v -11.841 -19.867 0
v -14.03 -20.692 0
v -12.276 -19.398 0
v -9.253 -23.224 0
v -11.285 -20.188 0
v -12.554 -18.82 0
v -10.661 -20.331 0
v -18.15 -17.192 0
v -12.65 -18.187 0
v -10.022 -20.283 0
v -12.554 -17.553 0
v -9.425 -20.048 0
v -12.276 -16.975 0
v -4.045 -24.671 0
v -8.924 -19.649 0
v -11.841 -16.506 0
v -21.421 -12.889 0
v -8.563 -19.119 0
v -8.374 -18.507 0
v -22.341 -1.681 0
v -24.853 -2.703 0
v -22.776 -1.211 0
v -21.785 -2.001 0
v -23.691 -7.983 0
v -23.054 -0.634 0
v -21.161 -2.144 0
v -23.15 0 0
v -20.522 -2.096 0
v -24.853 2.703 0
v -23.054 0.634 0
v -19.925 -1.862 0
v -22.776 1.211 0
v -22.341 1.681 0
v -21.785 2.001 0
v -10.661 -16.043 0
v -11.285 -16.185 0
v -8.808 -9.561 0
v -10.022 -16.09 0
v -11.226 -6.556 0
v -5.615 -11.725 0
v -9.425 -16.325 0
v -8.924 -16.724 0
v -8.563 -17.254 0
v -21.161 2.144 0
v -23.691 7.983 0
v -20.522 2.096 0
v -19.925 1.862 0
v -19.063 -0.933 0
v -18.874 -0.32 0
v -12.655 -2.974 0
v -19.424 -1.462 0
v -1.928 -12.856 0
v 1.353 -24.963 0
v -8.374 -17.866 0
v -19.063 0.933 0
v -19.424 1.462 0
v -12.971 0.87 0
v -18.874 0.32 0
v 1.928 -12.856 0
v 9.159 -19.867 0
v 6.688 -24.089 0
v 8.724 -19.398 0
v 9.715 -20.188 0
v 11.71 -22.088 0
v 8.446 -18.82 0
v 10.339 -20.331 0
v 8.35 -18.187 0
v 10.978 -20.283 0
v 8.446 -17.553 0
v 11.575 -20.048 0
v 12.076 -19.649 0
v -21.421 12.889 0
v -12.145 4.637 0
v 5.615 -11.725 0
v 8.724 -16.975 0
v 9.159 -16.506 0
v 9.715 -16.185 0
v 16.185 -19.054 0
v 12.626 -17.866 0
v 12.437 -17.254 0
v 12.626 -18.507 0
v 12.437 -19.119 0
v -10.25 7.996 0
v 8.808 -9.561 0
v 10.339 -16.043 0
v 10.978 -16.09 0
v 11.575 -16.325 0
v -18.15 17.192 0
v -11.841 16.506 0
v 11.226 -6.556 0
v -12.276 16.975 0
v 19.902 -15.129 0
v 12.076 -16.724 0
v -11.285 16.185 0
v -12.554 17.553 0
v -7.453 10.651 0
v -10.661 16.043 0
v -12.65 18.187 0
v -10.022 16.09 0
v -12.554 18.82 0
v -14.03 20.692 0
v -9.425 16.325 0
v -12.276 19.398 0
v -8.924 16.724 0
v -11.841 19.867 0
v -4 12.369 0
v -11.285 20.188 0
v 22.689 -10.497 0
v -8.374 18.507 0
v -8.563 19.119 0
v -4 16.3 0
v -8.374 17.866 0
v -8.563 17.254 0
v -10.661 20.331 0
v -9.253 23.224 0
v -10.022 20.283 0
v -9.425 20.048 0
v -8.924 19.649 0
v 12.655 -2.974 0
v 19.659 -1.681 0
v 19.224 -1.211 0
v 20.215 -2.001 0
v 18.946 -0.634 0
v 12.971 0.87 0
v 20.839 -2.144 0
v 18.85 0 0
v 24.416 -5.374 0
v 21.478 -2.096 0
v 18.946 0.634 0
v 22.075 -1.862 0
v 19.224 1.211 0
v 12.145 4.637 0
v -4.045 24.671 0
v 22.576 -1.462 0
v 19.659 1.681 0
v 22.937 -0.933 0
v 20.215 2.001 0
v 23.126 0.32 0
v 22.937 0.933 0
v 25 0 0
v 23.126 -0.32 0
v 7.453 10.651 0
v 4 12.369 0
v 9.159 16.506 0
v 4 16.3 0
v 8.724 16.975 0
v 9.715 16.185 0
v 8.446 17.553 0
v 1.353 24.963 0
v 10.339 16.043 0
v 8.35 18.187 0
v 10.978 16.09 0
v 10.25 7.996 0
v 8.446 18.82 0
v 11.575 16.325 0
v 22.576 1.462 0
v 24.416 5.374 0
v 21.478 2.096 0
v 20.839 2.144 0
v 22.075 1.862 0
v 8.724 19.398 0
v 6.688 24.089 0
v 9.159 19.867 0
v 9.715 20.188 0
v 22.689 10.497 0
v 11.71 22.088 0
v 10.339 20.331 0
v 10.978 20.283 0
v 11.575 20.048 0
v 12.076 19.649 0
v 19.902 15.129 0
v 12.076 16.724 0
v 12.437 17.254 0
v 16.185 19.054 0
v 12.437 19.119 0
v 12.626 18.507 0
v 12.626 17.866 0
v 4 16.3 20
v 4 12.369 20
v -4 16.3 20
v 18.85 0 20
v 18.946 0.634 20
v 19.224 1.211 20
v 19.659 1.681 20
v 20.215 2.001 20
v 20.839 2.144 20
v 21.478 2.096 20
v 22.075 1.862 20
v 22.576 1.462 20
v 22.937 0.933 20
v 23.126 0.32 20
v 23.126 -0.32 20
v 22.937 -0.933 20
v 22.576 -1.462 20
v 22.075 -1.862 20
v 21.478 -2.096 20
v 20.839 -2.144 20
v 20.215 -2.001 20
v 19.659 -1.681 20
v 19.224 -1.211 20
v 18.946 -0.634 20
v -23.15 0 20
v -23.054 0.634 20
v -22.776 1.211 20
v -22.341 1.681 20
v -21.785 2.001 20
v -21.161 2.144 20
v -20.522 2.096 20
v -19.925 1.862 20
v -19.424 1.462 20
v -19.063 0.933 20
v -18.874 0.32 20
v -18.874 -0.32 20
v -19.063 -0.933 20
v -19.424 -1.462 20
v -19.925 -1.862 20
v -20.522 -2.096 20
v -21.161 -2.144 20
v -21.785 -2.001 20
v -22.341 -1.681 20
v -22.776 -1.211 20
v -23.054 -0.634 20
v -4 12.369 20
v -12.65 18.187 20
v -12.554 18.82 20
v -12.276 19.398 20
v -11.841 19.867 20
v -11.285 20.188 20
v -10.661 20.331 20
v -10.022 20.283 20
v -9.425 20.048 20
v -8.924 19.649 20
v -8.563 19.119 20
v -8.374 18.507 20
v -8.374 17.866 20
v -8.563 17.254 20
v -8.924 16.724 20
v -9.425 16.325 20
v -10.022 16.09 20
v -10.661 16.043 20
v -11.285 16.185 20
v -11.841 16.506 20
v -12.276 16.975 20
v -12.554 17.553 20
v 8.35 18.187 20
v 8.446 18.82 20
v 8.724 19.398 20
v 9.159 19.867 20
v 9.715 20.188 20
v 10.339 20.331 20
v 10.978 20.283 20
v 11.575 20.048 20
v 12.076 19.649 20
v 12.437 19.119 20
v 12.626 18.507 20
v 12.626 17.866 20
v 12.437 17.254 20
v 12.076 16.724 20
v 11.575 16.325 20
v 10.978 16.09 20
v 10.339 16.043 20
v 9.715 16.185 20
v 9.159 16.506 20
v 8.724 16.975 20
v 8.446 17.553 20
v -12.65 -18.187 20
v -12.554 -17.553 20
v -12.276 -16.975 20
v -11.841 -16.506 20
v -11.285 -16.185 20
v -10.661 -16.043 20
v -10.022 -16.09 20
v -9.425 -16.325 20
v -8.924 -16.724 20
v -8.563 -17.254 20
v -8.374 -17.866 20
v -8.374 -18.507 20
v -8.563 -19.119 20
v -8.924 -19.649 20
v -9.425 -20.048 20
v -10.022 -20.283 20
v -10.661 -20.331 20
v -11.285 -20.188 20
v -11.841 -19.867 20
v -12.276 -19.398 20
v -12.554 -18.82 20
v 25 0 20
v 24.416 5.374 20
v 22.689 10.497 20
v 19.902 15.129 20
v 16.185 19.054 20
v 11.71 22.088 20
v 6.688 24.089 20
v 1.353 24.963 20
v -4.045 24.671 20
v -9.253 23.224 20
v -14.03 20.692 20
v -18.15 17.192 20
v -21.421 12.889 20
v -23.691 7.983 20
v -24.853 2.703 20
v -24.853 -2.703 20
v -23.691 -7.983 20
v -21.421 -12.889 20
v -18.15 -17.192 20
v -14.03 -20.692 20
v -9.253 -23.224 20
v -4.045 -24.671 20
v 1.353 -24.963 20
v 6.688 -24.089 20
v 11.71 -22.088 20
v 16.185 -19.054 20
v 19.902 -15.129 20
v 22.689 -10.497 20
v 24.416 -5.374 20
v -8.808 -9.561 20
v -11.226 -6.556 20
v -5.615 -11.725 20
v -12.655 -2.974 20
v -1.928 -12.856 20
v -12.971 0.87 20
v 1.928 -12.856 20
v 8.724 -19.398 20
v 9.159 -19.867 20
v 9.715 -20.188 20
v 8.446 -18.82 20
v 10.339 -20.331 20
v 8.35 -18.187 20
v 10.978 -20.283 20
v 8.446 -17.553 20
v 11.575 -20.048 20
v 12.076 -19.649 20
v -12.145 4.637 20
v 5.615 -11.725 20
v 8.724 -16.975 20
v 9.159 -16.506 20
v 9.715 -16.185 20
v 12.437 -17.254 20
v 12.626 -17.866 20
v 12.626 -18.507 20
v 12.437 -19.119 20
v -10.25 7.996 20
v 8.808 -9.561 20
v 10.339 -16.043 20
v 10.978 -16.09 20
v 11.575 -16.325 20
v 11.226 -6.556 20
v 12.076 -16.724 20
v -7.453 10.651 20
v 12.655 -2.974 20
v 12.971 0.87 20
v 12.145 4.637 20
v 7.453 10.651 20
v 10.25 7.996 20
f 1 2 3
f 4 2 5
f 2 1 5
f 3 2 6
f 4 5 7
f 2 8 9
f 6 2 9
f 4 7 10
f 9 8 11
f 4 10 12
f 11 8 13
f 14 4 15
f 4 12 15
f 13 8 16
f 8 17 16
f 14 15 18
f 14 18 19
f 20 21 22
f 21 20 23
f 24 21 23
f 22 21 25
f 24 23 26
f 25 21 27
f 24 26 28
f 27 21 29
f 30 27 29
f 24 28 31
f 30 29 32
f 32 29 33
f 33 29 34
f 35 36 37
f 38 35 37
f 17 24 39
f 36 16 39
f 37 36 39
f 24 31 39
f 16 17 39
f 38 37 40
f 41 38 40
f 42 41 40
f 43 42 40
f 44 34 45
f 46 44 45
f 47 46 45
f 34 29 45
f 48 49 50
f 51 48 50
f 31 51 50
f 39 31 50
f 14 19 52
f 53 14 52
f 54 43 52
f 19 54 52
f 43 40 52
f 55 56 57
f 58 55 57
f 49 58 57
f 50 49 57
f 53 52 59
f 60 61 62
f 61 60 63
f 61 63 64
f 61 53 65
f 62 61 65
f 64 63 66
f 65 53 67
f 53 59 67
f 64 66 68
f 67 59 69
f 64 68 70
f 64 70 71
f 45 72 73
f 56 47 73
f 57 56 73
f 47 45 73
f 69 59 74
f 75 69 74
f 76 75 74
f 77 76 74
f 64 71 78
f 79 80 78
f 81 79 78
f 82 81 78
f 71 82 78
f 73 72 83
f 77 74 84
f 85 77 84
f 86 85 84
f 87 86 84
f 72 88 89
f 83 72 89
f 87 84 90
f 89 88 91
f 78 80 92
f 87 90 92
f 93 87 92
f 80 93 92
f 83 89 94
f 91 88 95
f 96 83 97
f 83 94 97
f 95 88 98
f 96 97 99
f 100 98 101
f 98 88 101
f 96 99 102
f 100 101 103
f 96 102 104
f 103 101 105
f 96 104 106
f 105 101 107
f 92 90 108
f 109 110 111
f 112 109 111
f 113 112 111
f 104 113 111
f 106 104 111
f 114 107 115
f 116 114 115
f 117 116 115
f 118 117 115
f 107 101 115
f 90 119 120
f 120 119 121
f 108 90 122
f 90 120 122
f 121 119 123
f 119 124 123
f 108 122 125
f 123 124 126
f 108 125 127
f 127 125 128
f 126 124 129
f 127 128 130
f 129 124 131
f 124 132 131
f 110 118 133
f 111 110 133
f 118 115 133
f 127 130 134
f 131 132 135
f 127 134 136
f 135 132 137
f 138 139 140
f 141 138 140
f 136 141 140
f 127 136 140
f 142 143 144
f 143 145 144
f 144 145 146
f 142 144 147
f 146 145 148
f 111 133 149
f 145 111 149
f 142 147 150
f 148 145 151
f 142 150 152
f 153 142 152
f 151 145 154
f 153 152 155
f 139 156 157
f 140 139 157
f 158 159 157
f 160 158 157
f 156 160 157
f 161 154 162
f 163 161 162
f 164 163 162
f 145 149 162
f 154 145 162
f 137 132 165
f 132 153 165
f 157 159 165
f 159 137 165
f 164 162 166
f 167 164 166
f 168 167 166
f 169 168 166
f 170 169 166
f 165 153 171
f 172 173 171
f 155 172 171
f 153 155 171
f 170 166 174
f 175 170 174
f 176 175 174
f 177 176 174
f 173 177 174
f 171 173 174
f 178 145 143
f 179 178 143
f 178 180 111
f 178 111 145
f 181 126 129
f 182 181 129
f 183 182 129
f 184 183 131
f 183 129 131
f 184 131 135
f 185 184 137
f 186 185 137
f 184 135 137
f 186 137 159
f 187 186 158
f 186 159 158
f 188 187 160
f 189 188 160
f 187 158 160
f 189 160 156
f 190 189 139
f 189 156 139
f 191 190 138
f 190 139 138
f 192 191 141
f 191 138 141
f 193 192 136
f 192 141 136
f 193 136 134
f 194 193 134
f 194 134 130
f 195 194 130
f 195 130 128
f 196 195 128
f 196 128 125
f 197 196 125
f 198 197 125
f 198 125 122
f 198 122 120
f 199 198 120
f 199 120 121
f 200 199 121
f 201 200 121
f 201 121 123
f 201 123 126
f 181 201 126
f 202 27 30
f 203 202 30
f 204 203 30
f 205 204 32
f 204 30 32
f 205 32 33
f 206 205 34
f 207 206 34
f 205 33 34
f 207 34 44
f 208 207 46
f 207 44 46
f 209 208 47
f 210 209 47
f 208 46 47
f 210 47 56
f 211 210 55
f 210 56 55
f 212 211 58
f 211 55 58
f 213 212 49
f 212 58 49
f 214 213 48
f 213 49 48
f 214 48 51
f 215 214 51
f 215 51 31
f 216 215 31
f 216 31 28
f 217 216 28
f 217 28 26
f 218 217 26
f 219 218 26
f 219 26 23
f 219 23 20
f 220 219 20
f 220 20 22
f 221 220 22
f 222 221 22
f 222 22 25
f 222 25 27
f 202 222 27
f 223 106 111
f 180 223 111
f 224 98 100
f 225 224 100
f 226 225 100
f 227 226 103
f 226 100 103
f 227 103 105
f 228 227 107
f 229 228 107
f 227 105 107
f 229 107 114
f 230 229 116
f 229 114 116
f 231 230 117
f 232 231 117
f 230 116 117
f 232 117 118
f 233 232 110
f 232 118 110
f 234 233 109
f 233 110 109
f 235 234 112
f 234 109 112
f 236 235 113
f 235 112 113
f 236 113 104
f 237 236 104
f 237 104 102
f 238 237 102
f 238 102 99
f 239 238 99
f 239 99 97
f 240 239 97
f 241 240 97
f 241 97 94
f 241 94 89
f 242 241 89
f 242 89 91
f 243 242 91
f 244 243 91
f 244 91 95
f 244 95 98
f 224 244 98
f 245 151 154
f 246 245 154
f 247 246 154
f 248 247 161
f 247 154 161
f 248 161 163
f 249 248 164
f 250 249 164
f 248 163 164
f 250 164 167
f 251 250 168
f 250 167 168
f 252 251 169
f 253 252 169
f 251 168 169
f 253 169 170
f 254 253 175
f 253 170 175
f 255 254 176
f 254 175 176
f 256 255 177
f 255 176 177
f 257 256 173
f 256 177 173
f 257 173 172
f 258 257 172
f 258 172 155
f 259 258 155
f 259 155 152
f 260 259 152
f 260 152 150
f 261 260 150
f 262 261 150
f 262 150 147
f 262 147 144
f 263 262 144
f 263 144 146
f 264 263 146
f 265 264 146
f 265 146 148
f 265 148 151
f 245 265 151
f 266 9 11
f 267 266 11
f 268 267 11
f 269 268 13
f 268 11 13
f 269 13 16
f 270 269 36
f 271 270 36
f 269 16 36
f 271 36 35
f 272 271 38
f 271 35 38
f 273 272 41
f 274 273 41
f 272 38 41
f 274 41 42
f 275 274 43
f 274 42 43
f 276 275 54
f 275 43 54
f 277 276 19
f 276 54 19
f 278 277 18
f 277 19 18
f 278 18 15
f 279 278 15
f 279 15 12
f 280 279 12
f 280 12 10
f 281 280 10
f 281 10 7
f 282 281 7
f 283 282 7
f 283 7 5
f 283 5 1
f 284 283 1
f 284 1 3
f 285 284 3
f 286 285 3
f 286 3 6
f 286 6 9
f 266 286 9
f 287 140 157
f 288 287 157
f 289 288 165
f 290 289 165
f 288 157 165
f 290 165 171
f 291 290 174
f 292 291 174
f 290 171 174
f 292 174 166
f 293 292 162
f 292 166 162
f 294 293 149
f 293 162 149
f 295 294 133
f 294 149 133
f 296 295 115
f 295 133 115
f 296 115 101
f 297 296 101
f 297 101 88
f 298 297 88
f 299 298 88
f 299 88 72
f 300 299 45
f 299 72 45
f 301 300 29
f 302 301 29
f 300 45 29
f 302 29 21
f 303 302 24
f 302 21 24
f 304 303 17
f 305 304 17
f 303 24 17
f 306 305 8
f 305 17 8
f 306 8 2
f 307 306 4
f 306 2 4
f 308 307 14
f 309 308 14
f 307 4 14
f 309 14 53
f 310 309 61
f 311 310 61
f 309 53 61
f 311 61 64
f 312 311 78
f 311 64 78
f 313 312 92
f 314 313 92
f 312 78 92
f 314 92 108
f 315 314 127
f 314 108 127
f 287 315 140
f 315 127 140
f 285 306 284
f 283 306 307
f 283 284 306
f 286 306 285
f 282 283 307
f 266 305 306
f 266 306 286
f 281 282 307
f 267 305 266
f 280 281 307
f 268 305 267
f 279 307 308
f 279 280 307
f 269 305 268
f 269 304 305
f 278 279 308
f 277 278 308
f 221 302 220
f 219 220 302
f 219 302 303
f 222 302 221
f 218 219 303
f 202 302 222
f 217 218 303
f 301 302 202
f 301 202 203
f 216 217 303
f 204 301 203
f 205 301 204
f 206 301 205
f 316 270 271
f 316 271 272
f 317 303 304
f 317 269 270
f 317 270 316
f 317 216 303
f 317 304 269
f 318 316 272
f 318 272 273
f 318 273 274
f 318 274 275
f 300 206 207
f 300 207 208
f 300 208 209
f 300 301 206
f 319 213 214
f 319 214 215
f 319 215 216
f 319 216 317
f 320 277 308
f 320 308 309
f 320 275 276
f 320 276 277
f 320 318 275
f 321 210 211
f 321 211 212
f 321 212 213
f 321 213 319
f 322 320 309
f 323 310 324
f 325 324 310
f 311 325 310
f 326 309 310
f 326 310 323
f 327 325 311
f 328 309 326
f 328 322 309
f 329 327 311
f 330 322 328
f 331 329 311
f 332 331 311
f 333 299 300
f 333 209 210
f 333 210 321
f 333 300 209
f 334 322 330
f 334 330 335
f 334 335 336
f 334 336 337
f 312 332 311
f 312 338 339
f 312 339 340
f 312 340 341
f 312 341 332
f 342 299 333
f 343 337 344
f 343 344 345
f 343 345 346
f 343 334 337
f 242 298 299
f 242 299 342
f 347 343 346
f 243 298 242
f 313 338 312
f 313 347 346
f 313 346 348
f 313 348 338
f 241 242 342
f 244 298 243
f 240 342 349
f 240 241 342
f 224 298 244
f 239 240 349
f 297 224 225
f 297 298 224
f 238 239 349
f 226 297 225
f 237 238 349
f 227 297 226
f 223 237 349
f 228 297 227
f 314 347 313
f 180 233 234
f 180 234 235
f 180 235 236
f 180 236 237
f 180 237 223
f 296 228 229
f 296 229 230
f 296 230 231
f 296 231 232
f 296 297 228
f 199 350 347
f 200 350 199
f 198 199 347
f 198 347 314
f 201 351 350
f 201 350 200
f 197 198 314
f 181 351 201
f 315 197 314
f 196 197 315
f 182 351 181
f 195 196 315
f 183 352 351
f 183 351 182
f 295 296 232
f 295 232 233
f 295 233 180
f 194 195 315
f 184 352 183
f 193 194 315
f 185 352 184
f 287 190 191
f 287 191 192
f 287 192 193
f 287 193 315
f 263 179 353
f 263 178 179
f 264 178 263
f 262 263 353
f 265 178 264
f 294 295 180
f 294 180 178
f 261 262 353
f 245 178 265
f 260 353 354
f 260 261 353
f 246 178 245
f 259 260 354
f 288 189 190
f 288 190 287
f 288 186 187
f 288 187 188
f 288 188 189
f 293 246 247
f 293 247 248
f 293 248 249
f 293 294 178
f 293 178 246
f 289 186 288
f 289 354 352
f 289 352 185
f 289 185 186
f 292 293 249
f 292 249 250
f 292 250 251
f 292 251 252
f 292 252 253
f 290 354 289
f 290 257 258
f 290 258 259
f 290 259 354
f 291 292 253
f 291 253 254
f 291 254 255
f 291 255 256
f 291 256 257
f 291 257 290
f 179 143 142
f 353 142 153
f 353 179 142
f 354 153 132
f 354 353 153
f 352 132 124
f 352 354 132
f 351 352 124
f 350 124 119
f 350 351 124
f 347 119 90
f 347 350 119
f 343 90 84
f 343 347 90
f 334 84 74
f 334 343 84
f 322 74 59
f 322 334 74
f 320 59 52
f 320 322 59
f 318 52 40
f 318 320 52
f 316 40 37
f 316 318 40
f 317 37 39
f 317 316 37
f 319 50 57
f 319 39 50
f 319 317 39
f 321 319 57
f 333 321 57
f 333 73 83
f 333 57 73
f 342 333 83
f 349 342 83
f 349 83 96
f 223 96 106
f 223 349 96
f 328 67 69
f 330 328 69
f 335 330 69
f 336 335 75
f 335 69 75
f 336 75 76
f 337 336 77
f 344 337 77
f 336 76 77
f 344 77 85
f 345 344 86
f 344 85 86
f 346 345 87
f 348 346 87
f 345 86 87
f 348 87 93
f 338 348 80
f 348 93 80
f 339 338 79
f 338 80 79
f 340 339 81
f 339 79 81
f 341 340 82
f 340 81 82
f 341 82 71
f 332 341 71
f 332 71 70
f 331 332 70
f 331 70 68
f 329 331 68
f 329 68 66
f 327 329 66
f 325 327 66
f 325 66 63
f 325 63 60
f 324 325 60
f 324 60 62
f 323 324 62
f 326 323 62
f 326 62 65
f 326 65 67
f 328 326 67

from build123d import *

# Parameters (mm, degrees)
CROQUIS1_R                   = 25
SALIENTE_EXTRUIR1_DEPTH      = 20
KEYWAY_DEPTH                 = 21
TALADRO_DE_MARGEN_PARA_M41_D = 4.3


with BuildPart() as part:
    # Croquis1 → Saliente-Extruir1 (new body)
    with BuildSketch(Plane.XY):
        Circle(CROQUIS1_R)
    extrude(amount=SALIENTE_EXTRUIR1_DEPTH)

    # KeySketch → Keyway (cut, through all)
    with BuildSketch(Plane(origin=(-0.358560603, -1.171254478, 20), x_dir=(1, 0, 0), z_dir=(0, 0, 1))):
        with BuildLine():
            Line((-3.641439397, 13.540571355), (-3.641439397, 17.471254478))
            Line((-3.641439397, 17.471254478), (4.358560603, 17.471254478))
            Line((4.358560603, 17.471254478), (4.358560603, 13.540571355))
            ThreePointArc((4.358560603, 13.540571355), (0.358560603, -11.828745522), (-3.641439397, 13.540571355))
        make_face()
    extrude(amount=-KEYWAY_DEPTH, mode=Mode.SUBTRACT)

    # Taladro de margen para M41 (through all)
    with Locations(Plane.XY.offset(20)):
        with Locations((21, 0), (10.5, -18.186533479), (-10.5, -18.186533479), (-21, 0), (-10.5, 18.186533479), (10.5, 18.186533479)):
            Hole(TALADRO_DE_MARGEN_PARA_M41_D / 2)


solid = part.part
